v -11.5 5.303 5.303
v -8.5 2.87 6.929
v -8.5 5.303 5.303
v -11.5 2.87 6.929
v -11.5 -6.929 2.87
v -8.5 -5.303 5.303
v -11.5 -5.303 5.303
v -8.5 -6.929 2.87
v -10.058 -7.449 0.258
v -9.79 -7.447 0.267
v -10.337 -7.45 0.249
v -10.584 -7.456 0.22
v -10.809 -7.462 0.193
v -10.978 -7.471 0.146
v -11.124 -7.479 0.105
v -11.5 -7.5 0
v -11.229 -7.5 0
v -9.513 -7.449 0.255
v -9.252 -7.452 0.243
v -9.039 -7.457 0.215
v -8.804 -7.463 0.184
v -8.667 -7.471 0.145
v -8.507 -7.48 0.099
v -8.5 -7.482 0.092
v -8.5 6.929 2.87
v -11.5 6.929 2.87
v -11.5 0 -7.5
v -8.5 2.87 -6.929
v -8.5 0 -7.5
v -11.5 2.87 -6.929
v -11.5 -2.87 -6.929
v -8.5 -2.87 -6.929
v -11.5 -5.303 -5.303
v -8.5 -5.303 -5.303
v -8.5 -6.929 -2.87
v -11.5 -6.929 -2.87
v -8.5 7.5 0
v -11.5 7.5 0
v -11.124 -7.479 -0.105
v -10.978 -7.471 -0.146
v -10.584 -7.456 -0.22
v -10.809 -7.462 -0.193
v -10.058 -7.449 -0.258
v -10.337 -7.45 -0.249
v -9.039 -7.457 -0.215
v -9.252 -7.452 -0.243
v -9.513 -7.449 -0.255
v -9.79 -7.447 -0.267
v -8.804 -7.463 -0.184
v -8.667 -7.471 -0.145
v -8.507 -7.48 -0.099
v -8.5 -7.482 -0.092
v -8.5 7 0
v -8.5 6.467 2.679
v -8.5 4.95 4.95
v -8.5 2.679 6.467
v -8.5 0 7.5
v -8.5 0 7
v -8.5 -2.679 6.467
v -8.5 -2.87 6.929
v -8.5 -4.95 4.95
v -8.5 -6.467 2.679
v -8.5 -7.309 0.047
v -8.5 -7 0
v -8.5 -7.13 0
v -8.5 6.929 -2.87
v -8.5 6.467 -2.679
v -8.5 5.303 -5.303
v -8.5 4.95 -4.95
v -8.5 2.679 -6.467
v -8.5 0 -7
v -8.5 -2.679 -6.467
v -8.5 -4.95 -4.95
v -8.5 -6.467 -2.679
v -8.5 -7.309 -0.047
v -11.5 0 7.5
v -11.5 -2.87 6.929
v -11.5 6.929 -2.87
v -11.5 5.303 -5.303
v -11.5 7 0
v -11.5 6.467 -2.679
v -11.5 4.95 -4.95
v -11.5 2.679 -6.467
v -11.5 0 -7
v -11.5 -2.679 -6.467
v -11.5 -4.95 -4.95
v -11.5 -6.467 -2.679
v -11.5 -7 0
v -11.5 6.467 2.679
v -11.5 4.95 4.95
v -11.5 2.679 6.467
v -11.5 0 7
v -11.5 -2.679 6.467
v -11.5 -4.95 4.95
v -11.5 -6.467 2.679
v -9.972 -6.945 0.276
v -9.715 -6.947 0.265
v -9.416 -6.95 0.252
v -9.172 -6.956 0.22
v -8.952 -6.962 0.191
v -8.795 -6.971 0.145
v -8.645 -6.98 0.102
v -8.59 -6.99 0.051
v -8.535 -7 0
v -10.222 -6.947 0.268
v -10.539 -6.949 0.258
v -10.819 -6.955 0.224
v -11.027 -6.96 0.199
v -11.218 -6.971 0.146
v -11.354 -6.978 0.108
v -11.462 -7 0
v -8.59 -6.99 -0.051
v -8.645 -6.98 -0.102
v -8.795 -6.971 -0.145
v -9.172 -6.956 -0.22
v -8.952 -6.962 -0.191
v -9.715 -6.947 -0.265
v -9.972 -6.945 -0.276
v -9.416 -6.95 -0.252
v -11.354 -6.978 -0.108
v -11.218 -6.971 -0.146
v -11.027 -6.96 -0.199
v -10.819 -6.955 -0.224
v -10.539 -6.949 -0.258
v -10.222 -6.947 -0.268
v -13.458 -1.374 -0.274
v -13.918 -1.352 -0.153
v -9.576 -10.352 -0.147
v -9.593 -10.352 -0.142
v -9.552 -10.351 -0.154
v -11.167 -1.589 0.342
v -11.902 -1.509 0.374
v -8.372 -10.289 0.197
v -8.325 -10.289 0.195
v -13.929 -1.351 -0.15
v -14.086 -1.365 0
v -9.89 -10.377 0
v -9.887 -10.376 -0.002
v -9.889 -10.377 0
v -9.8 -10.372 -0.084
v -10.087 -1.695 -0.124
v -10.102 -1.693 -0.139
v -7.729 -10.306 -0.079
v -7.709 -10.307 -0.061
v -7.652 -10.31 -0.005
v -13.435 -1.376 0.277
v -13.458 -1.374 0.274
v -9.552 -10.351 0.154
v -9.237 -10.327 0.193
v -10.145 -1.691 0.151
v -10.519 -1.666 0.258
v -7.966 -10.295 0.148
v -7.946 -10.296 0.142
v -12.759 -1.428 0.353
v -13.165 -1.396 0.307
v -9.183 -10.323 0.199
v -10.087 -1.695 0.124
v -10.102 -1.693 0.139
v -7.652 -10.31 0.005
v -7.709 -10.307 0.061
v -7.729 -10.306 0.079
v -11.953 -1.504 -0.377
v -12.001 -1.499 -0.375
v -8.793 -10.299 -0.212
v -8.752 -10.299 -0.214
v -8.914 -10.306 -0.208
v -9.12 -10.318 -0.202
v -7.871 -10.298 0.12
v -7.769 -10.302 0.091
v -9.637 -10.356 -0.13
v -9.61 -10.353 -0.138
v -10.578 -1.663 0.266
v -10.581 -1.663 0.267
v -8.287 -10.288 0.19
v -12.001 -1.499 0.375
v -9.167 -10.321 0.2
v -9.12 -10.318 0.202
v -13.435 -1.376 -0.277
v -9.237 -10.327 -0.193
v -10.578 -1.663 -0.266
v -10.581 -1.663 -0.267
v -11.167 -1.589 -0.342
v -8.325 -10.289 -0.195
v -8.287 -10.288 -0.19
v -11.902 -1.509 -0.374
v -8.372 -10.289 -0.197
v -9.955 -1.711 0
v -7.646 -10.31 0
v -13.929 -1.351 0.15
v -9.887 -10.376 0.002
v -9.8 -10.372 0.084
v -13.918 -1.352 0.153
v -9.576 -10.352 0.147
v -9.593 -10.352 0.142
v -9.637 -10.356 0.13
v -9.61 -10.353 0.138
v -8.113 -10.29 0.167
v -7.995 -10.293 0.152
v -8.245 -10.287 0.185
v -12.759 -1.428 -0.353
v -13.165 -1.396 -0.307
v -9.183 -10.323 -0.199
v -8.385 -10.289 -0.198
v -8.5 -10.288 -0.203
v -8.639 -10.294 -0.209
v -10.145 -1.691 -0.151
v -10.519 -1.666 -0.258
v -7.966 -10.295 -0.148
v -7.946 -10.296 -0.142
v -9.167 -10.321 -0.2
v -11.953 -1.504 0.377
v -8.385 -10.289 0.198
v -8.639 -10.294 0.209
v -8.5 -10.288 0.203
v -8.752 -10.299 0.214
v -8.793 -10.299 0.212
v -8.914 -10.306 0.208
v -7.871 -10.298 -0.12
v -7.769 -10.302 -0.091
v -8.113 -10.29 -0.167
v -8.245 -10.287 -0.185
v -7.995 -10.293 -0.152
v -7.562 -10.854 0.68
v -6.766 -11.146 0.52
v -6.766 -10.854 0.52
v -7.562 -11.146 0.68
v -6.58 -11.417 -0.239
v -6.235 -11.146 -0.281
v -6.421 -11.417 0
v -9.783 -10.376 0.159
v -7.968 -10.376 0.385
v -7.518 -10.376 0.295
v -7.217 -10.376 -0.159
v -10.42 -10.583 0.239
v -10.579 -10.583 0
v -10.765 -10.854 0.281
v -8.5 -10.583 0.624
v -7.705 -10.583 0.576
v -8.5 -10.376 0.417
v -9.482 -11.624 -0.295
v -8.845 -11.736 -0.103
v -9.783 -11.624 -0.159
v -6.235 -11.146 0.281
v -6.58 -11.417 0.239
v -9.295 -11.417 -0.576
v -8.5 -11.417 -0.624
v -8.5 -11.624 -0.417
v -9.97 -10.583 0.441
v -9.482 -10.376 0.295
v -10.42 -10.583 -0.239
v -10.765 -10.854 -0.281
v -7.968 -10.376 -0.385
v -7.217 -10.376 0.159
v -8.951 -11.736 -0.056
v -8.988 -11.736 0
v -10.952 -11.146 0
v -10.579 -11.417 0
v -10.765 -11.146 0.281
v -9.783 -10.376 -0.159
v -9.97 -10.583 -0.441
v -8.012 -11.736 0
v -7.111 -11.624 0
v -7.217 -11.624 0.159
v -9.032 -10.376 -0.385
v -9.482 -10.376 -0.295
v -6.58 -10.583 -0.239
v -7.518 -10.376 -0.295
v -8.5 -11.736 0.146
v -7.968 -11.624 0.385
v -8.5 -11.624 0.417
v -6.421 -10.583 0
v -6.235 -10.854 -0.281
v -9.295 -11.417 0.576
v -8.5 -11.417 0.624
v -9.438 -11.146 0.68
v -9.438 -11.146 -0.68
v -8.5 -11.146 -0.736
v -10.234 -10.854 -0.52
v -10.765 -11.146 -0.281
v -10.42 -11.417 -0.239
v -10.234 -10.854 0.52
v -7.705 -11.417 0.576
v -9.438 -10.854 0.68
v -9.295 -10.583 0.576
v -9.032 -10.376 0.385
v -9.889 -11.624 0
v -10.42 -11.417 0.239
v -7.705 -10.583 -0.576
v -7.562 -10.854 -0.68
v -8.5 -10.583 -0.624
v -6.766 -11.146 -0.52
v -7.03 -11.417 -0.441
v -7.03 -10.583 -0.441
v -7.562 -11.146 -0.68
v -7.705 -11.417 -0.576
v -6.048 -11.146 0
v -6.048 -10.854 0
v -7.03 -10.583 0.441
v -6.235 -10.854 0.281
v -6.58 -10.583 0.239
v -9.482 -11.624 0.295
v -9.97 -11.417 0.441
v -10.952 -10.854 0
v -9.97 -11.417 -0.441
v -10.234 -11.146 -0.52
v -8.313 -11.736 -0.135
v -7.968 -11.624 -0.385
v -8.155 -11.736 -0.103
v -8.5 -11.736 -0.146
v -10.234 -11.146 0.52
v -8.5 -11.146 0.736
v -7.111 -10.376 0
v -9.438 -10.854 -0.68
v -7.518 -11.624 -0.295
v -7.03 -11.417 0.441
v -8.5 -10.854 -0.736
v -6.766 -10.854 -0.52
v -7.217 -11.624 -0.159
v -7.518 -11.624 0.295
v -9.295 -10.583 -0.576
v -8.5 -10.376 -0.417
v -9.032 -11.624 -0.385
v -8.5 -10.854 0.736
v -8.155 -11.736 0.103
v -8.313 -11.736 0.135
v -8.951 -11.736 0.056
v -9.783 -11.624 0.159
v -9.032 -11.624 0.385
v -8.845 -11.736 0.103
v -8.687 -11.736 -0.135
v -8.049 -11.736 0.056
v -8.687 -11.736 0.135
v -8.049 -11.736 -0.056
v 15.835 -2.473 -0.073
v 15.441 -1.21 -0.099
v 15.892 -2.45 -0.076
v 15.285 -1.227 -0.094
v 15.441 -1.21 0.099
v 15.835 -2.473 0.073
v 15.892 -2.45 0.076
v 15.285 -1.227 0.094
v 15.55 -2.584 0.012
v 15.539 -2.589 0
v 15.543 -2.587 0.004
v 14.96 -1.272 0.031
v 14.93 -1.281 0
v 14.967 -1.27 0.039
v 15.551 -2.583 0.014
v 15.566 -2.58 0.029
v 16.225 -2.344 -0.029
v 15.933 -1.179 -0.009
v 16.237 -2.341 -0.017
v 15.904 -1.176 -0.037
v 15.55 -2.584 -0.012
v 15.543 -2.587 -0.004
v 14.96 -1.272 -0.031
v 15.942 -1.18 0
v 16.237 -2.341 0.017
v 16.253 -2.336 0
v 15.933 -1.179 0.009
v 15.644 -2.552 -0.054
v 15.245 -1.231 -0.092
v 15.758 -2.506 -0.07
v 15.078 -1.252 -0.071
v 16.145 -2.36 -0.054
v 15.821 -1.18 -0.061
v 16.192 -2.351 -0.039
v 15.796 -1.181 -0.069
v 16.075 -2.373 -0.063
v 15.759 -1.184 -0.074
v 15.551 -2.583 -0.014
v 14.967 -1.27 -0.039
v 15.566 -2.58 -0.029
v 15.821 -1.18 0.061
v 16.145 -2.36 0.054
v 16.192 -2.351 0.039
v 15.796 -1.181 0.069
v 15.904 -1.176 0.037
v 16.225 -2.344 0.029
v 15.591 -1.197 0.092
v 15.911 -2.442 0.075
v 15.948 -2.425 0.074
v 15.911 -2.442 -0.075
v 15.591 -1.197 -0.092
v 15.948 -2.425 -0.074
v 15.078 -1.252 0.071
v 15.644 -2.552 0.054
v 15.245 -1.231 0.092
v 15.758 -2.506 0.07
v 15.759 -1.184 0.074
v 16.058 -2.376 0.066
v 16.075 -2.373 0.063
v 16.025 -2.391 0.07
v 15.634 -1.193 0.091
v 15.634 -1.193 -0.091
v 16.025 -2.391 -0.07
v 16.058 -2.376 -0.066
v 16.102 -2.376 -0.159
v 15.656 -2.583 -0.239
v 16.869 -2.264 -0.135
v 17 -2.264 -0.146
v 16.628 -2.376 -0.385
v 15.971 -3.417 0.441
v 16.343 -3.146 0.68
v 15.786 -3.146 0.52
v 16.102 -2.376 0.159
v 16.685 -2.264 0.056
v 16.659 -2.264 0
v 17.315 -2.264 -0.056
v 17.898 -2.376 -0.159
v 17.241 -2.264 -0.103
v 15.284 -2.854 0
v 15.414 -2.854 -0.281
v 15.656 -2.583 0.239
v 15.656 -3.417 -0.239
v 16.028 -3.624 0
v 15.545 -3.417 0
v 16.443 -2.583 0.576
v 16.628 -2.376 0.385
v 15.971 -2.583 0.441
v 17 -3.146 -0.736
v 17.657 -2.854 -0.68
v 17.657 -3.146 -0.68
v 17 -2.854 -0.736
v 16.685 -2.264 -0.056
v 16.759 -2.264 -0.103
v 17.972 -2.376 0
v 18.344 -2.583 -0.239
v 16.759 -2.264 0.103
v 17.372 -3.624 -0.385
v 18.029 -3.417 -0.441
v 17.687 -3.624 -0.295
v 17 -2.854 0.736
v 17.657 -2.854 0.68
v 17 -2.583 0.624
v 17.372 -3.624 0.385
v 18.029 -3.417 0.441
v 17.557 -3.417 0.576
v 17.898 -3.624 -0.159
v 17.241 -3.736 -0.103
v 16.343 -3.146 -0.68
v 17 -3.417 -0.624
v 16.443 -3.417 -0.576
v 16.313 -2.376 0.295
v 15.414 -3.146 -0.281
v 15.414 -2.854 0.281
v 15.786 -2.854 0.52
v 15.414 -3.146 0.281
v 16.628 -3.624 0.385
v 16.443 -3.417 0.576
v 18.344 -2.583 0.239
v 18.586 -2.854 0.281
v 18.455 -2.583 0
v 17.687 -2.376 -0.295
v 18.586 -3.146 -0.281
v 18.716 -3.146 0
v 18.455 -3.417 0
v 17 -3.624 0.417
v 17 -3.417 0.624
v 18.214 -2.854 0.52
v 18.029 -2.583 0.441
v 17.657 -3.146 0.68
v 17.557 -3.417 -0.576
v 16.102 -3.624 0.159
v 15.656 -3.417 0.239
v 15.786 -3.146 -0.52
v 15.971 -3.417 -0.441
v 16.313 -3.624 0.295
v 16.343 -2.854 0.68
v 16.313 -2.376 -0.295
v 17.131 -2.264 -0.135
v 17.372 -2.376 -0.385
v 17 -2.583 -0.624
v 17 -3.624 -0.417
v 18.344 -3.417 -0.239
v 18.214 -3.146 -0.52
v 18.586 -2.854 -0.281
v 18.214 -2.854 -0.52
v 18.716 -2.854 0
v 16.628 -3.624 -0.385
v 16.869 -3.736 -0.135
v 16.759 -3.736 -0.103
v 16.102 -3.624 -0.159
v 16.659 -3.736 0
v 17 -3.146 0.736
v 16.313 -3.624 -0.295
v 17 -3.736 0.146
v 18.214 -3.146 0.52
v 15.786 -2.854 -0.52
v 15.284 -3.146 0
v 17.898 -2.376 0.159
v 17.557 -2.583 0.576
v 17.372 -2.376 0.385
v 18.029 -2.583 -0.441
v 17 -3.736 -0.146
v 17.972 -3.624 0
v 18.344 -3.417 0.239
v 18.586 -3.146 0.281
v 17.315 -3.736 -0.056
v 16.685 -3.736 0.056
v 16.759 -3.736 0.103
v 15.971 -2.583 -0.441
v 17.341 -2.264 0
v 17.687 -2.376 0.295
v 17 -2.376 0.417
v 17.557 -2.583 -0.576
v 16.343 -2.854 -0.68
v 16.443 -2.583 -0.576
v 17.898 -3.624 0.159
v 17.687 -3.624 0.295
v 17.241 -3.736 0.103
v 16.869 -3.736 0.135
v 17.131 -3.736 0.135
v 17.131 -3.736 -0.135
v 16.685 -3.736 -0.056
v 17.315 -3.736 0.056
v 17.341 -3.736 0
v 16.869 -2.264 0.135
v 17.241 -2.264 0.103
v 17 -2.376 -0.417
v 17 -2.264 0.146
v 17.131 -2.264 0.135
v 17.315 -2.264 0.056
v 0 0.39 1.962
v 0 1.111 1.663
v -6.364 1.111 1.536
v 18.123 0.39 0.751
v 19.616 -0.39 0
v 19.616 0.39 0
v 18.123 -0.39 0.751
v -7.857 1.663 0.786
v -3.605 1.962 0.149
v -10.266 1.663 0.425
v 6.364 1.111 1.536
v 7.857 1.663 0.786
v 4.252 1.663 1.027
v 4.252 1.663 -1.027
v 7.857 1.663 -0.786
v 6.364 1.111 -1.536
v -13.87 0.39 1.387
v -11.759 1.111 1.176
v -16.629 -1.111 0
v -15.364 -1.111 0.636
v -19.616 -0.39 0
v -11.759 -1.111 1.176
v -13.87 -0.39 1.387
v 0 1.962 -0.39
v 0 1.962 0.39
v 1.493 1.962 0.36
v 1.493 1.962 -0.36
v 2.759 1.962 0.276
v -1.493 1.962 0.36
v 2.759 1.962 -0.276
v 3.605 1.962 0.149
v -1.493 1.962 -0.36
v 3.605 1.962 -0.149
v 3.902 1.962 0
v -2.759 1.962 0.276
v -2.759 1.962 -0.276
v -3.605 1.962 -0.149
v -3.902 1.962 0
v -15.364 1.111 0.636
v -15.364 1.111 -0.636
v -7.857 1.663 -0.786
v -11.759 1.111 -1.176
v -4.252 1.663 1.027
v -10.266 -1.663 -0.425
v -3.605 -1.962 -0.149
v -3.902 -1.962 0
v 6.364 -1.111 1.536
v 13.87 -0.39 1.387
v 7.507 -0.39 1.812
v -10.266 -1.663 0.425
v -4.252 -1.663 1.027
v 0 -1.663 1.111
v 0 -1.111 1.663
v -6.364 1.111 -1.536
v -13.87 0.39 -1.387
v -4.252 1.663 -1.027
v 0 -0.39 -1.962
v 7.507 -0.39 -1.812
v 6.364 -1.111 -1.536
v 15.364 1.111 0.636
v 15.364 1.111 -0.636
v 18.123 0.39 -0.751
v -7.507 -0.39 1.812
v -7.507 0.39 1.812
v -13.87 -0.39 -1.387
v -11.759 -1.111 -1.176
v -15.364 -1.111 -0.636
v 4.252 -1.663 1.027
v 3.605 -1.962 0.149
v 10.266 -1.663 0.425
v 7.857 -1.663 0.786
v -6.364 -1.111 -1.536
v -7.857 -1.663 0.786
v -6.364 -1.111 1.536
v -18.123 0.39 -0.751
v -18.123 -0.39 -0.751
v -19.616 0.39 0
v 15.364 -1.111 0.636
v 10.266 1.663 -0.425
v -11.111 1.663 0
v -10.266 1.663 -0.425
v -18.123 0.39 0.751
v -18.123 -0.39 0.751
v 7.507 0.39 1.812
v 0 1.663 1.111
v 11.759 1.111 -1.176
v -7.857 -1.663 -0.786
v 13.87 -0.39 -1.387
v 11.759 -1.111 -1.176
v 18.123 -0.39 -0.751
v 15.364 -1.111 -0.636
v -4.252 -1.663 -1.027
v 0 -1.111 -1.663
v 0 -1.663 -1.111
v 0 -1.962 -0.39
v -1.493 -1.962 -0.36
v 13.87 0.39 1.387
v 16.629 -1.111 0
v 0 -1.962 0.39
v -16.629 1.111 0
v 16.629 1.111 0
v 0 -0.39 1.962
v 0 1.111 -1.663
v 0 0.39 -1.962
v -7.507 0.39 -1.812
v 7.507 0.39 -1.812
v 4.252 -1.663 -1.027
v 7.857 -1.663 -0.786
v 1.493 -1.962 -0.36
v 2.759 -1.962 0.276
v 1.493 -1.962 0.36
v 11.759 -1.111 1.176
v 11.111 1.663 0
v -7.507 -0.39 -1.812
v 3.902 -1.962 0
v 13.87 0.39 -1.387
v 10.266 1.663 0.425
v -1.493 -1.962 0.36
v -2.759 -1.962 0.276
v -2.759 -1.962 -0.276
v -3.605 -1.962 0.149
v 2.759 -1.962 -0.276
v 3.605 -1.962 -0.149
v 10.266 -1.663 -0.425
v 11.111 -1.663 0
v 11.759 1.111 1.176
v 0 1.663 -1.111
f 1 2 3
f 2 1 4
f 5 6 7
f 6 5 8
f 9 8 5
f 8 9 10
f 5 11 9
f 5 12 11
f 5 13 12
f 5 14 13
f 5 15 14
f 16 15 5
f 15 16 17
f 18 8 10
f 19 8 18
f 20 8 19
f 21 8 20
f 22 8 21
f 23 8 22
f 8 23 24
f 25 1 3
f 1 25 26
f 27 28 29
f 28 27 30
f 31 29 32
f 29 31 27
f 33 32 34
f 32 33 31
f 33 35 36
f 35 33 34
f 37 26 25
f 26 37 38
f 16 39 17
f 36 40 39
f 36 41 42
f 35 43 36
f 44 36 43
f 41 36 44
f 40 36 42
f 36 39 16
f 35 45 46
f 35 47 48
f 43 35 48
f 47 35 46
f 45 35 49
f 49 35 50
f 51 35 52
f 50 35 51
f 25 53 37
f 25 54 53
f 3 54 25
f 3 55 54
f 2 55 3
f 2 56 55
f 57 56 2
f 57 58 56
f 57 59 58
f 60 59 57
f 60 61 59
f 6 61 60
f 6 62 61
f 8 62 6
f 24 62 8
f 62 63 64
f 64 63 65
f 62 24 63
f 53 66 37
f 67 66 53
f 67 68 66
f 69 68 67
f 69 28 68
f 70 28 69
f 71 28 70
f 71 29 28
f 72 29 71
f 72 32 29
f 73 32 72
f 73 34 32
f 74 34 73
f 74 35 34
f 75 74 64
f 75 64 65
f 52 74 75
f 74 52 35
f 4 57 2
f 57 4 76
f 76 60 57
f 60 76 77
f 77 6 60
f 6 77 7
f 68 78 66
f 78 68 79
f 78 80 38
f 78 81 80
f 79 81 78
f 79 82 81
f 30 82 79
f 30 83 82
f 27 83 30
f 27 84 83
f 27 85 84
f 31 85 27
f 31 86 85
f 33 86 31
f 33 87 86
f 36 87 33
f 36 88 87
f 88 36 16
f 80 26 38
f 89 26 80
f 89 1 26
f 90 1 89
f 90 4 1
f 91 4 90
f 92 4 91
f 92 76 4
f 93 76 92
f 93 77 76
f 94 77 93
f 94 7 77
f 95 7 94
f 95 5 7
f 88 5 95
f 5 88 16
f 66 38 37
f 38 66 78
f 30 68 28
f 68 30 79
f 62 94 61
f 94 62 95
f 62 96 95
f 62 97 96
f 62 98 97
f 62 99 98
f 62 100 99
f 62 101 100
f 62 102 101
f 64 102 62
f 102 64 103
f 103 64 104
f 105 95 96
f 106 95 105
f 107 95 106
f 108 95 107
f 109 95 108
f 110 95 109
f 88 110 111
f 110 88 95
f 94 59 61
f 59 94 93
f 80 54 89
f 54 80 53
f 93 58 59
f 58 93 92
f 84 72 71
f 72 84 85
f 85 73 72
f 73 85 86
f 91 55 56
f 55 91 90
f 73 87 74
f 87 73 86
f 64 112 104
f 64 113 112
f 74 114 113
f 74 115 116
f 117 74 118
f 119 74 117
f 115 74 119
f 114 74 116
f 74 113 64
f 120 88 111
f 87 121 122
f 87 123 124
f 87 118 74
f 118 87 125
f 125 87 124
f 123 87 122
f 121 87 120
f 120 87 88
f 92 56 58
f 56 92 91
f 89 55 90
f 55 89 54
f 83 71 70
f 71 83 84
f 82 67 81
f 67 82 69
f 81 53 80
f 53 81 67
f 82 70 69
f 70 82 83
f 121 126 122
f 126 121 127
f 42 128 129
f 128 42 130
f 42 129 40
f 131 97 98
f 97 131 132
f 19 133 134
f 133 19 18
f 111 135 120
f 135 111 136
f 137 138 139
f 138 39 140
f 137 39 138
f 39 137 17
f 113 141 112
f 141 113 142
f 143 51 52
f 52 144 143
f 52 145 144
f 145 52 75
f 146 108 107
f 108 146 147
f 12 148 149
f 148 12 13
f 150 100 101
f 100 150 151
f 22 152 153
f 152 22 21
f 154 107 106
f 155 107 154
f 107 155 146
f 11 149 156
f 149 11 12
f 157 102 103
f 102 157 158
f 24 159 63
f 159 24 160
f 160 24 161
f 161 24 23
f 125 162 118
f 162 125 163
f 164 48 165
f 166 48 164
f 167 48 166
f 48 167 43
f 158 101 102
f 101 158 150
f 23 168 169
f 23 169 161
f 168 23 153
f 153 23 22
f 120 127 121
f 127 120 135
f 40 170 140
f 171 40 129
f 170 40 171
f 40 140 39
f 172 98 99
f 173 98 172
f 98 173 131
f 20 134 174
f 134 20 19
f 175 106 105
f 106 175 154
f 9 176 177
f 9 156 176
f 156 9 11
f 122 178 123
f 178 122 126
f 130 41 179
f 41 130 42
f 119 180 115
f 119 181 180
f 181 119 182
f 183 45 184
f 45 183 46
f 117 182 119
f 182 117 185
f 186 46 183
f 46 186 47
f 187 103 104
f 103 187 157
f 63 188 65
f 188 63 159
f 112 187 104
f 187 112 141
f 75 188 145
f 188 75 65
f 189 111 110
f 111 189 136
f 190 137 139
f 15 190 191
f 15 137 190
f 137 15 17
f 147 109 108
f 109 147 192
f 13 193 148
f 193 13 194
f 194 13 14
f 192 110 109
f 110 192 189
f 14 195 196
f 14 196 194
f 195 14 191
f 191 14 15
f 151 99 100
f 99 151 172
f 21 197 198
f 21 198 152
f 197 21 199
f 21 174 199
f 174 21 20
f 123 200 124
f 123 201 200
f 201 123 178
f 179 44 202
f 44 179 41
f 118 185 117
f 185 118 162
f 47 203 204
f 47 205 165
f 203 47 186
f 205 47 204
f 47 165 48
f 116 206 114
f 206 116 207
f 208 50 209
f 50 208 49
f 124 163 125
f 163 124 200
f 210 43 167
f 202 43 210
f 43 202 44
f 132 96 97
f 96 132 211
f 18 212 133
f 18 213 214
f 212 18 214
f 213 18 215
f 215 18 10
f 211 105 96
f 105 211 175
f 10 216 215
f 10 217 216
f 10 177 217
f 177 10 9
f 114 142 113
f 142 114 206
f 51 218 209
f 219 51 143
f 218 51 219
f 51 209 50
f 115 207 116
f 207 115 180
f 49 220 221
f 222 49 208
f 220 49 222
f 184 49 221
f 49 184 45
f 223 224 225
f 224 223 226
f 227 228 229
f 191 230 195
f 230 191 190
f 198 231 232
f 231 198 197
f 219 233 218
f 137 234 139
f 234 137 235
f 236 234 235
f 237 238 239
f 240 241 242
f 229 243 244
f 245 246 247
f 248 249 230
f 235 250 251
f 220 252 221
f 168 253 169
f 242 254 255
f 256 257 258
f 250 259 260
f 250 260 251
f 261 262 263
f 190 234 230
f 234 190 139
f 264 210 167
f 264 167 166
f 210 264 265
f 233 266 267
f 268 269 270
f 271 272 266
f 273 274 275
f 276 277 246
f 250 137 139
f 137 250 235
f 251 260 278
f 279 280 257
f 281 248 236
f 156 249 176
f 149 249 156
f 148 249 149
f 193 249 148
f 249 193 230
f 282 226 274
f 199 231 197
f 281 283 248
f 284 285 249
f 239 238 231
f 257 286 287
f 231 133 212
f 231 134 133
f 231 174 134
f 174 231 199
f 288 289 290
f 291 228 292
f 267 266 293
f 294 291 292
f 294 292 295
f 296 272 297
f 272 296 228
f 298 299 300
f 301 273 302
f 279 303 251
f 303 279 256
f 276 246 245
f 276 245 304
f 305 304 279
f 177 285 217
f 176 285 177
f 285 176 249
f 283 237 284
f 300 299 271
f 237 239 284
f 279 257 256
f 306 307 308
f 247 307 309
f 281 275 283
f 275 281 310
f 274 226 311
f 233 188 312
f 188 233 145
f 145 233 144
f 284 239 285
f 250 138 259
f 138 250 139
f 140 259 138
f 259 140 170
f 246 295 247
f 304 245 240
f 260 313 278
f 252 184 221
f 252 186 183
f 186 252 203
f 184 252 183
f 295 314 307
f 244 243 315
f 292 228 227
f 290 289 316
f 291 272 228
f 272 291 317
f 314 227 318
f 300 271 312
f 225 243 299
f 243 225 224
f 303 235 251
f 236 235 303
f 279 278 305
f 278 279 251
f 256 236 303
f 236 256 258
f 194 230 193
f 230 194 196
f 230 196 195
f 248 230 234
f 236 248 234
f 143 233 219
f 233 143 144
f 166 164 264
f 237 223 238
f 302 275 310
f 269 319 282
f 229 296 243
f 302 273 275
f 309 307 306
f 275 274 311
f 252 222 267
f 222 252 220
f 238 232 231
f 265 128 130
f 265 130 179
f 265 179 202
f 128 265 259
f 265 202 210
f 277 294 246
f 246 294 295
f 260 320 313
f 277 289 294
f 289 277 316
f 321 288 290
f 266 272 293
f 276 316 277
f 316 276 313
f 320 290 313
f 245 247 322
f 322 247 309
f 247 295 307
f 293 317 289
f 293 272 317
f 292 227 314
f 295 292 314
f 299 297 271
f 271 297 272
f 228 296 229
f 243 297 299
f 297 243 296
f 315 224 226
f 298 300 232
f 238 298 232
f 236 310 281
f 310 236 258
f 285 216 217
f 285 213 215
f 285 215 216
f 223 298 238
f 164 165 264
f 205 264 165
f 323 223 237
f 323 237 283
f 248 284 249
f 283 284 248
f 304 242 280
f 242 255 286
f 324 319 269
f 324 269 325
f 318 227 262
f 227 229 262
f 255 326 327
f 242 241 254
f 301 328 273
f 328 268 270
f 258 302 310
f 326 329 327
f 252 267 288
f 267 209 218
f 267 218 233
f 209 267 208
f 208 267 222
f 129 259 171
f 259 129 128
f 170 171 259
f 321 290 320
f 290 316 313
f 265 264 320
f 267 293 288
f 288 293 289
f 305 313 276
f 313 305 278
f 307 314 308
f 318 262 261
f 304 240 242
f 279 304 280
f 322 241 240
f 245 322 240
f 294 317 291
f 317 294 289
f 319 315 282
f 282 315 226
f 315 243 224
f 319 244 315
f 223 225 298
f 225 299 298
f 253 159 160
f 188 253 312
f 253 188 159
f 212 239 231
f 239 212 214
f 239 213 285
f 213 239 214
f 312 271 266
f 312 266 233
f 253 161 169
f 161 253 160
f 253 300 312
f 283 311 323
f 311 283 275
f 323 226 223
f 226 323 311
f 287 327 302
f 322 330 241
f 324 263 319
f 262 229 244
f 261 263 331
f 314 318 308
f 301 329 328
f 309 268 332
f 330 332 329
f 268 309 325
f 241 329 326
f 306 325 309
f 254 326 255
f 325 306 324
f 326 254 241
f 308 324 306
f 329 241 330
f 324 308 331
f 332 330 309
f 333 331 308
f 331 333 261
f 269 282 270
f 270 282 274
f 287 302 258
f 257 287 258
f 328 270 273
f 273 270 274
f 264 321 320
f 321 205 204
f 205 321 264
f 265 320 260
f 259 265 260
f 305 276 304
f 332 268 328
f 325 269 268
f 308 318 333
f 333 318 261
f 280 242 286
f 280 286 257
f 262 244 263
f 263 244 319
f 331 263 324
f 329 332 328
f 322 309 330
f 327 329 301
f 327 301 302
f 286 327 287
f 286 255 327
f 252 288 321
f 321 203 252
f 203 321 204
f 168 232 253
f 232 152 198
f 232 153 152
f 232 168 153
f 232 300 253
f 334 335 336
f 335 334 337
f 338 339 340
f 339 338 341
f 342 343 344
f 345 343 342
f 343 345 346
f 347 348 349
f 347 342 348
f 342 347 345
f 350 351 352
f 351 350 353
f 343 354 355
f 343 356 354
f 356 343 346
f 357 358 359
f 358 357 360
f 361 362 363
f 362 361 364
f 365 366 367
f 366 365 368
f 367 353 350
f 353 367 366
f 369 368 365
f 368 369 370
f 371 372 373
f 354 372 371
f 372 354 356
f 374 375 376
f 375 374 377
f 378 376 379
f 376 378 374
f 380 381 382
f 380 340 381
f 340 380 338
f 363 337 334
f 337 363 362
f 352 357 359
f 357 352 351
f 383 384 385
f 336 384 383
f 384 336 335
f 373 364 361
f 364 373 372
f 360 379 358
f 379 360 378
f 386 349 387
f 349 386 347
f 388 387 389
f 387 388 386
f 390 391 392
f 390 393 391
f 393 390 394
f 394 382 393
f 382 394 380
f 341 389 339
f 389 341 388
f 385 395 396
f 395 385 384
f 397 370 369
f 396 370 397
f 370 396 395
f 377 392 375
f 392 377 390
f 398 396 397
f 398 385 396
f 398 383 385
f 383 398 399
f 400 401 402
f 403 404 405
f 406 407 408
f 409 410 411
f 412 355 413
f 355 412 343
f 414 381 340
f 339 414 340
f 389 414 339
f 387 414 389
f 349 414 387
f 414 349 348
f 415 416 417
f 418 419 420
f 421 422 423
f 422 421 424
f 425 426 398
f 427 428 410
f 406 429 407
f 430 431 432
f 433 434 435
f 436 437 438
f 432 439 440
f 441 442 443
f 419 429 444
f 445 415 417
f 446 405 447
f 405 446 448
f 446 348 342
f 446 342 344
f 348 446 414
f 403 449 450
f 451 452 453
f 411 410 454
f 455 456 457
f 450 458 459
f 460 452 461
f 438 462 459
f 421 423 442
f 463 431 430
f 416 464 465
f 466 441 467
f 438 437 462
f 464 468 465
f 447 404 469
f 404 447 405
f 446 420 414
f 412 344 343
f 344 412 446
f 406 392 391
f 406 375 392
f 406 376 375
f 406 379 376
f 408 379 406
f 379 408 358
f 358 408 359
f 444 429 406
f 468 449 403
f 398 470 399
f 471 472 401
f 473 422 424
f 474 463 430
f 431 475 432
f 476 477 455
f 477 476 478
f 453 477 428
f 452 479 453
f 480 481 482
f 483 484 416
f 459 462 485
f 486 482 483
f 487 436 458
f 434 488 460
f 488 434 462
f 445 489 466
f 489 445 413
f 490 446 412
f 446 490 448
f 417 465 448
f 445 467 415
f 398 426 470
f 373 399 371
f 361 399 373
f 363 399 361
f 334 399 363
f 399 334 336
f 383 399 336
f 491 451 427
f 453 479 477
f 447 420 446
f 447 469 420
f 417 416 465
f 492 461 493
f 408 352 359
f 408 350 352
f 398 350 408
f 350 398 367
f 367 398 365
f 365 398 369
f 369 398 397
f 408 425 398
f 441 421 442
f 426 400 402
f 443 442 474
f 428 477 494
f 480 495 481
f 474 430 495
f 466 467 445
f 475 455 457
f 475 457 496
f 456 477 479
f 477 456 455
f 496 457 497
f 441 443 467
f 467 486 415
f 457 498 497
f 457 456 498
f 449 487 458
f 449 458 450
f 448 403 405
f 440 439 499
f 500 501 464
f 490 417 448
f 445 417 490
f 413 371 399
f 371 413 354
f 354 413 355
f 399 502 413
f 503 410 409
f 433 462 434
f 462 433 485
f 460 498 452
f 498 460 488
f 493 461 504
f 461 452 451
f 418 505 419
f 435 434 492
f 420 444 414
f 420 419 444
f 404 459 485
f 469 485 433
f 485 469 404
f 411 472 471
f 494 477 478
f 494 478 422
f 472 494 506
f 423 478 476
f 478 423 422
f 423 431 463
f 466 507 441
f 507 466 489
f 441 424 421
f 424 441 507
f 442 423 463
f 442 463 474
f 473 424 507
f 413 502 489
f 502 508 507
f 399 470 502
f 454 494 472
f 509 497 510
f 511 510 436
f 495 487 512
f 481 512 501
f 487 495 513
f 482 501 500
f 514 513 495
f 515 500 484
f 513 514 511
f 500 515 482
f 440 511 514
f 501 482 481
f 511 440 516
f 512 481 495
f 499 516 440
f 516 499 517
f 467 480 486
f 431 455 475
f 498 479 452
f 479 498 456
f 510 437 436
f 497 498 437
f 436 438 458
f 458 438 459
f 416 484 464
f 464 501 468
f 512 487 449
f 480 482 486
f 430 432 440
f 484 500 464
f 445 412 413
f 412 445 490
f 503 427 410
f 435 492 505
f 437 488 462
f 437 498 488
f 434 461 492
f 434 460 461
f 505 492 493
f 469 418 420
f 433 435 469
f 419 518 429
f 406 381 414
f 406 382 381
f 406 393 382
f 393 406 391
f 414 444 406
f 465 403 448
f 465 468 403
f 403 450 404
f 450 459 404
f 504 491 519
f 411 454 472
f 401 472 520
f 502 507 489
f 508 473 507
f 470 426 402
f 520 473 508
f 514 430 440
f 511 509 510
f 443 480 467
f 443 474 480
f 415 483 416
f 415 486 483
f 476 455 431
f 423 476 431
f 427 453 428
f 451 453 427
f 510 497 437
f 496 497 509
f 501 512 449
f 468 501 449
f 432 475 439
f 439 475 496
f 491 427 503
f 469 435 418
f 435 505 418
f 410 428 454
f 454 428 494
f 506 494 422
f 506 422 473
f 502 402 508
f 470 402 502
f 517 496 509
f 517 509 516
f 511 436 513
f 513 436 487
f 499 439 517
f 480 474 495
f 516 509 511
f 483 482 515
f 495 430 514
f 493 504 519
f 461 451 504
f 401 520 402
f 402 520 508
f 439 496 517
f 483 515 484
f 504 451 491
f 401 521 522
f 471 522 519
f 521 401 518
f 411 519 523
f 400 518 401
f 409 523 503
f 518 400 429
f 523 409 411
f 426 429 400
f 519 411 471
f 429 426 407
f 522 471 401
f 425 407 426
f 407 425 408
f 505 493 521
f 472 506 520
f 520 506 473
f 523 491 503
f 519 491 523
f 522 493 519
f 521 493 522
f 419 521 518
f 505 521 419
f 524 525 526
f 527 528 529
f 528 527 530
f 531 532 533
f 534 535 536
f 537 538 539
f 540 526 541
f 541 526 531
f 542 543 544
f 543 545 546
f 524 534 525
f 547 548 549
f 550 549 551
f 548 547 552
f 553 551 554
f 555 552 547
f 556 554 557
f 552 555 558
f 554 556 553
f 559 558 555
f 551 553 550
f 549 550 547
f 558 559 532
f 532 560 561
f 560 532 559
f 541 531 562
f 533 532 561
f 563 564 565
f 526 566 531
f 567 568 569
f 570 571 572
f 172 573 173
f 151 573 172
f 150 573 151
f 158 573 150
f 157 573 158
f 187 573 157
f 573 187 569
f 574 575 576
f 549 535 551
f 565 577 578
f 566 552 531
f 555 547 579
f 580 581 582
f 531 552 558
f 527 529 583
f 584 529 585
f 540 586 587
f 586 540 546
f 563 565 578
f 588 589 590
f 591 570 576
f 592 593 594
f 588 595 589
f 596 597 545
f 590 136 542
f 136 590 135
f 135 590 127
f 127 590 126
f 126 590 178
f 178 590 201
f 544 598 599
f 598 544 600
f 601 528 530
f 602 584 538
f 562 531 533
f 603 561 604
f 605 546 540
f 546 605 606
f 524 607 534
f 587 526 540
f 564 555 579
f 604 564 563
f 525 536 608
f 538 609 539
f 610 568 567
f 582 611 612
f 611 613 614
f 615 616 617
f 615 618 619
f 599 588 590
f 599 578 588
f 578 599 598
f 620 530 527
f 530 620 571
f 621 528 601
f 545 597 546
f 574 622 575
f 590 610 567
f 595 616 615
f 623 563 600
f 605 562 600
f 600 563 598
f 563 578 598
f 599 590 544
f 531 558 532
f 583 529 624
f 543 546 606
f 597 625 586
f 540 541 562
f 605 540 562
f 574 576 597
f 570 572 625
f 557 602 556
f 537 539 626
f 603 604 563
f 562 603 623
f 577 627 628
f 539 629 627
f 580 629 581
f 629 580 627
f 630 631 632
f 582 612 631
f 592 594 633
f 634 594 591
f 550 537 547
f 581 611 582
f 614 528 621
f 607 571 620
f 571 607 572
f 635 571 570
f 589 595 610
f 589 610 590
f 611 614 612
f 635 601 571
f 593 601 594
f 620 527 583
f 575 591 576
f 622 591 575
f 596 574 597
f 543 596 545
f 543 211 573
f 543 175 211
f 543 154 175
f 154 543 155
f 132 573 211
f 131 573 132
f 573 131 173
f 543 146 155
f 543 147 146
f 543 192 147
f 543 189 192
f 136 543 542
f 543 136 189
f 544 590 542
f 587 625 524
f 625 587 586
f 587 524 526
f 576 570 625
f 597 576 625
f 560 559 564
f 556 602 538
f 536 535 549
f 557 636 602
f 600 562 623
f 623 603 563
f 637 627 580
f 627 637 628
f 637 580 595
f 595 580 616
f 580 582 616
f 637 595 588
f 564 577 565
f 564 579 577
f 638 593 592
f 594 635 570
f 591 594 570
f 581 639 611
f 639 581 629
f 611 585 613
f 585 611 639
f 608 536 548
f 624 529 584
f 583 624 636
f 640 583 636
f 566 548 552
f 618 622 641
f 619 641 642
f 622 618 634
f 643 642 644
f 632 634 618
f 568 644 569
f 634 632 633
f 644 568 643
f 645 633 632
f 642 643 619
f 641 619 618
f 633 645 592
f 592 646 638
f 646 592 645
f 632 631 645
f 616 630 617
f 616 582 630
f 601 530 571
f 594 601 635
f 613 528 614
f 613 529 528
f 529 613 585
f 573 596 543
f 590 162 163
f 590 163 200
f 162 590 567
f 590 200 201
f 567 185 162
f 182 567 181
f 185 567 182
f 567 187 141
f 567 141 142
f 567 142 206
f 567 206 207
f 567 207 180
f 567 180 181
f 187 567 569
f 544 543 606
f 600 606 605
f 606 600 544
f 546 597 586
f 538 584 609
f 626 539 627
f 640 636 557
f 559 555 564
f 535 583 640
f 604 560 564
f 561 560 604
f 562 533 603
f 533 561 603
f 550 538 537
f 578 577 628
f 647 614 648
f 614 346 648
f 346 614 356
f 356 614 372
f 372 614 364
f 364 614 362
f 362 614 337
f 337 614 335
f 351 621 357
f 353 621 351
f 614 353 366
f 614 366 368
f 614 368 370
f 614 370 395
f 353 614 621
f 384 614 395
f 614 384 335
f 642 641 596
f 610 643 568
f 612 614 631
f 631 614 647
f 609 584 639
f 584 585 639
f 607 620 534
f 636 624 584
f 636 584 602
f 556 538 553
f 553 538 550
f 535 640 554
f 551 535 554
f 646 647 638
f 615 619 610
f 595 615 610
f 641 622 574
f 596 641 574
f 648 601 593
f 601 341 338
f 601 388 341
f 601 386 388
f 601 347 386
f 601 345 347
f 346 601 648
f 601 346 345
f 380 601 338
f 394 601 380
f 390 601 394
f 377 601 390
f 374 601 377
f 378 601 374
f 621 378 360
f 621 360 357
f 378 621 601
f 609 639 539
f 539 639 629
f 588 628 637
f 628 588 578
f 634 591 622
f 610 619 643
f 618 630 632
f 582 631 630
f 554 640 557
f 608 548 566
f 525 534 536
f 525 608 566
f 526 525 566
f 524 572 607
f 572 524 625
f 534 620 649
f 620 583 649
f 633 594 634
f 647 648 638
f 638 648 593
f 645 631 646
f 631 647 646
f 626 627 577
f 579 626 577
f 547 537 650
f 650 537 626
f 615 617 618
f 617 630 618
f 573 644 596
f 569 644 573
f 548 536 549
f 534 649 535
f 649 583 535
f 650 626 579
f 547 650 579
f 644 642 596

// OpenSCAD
$fn=16;

module tail()
{
	rotate(a = 90, v = [0, 1, 0])
	difference() {
		cylinder(h = 6, r1 = 15, r2 = 15, center = true);
		cylinder(h = 7, r1 = 14, r2 = 14, center = true);
	}
}

module tail_pillar()
{
	translate(v = [0, 0, -12])
	scale(v = [1, 0.2, 1])
	cylinder(h = 23, r1 = 2, r2 = 4, center = true);
}

module fuselage()
{
	scale(v = [1, 0.1, 0.1])
		sphere(r = 40);
}

module tail_assembly()
{
	translate(v = [20, 0, 0]) {
		tail();
		translate(v = [5, 0, 0])
		rotate(a = 20, v = [0, 1, 0])
			tail_pillar();
		translate(v = [-3, 0, -22])
		scale(v = [1, 0.3, 0.3])
			sphere(r = 5);
	}
}

module cockpit()
{
	translate(v = [-30, 0, 0]) {
		rotate(a = 20, v = [0, 1, 0])
			scale(v = [0.3, 0.3, 0.3])
				tail_pillar();
		translate(v = [-4, 0, -6])
			scale(v = [0.7, 0.3, 0.3])
				sphere(r = 5);
	}
}


module spacefarer()
{
	scale(v = [0.5, 0.5, 0.5]) {
		union() {
			tail_assembly();
			fuselage();
			cockpit();
		}
	}
}
rotate(a = 180, v = [0, 1, 0])
rotate(a = -90, v = [1, 0, 0])
spacefarer();
